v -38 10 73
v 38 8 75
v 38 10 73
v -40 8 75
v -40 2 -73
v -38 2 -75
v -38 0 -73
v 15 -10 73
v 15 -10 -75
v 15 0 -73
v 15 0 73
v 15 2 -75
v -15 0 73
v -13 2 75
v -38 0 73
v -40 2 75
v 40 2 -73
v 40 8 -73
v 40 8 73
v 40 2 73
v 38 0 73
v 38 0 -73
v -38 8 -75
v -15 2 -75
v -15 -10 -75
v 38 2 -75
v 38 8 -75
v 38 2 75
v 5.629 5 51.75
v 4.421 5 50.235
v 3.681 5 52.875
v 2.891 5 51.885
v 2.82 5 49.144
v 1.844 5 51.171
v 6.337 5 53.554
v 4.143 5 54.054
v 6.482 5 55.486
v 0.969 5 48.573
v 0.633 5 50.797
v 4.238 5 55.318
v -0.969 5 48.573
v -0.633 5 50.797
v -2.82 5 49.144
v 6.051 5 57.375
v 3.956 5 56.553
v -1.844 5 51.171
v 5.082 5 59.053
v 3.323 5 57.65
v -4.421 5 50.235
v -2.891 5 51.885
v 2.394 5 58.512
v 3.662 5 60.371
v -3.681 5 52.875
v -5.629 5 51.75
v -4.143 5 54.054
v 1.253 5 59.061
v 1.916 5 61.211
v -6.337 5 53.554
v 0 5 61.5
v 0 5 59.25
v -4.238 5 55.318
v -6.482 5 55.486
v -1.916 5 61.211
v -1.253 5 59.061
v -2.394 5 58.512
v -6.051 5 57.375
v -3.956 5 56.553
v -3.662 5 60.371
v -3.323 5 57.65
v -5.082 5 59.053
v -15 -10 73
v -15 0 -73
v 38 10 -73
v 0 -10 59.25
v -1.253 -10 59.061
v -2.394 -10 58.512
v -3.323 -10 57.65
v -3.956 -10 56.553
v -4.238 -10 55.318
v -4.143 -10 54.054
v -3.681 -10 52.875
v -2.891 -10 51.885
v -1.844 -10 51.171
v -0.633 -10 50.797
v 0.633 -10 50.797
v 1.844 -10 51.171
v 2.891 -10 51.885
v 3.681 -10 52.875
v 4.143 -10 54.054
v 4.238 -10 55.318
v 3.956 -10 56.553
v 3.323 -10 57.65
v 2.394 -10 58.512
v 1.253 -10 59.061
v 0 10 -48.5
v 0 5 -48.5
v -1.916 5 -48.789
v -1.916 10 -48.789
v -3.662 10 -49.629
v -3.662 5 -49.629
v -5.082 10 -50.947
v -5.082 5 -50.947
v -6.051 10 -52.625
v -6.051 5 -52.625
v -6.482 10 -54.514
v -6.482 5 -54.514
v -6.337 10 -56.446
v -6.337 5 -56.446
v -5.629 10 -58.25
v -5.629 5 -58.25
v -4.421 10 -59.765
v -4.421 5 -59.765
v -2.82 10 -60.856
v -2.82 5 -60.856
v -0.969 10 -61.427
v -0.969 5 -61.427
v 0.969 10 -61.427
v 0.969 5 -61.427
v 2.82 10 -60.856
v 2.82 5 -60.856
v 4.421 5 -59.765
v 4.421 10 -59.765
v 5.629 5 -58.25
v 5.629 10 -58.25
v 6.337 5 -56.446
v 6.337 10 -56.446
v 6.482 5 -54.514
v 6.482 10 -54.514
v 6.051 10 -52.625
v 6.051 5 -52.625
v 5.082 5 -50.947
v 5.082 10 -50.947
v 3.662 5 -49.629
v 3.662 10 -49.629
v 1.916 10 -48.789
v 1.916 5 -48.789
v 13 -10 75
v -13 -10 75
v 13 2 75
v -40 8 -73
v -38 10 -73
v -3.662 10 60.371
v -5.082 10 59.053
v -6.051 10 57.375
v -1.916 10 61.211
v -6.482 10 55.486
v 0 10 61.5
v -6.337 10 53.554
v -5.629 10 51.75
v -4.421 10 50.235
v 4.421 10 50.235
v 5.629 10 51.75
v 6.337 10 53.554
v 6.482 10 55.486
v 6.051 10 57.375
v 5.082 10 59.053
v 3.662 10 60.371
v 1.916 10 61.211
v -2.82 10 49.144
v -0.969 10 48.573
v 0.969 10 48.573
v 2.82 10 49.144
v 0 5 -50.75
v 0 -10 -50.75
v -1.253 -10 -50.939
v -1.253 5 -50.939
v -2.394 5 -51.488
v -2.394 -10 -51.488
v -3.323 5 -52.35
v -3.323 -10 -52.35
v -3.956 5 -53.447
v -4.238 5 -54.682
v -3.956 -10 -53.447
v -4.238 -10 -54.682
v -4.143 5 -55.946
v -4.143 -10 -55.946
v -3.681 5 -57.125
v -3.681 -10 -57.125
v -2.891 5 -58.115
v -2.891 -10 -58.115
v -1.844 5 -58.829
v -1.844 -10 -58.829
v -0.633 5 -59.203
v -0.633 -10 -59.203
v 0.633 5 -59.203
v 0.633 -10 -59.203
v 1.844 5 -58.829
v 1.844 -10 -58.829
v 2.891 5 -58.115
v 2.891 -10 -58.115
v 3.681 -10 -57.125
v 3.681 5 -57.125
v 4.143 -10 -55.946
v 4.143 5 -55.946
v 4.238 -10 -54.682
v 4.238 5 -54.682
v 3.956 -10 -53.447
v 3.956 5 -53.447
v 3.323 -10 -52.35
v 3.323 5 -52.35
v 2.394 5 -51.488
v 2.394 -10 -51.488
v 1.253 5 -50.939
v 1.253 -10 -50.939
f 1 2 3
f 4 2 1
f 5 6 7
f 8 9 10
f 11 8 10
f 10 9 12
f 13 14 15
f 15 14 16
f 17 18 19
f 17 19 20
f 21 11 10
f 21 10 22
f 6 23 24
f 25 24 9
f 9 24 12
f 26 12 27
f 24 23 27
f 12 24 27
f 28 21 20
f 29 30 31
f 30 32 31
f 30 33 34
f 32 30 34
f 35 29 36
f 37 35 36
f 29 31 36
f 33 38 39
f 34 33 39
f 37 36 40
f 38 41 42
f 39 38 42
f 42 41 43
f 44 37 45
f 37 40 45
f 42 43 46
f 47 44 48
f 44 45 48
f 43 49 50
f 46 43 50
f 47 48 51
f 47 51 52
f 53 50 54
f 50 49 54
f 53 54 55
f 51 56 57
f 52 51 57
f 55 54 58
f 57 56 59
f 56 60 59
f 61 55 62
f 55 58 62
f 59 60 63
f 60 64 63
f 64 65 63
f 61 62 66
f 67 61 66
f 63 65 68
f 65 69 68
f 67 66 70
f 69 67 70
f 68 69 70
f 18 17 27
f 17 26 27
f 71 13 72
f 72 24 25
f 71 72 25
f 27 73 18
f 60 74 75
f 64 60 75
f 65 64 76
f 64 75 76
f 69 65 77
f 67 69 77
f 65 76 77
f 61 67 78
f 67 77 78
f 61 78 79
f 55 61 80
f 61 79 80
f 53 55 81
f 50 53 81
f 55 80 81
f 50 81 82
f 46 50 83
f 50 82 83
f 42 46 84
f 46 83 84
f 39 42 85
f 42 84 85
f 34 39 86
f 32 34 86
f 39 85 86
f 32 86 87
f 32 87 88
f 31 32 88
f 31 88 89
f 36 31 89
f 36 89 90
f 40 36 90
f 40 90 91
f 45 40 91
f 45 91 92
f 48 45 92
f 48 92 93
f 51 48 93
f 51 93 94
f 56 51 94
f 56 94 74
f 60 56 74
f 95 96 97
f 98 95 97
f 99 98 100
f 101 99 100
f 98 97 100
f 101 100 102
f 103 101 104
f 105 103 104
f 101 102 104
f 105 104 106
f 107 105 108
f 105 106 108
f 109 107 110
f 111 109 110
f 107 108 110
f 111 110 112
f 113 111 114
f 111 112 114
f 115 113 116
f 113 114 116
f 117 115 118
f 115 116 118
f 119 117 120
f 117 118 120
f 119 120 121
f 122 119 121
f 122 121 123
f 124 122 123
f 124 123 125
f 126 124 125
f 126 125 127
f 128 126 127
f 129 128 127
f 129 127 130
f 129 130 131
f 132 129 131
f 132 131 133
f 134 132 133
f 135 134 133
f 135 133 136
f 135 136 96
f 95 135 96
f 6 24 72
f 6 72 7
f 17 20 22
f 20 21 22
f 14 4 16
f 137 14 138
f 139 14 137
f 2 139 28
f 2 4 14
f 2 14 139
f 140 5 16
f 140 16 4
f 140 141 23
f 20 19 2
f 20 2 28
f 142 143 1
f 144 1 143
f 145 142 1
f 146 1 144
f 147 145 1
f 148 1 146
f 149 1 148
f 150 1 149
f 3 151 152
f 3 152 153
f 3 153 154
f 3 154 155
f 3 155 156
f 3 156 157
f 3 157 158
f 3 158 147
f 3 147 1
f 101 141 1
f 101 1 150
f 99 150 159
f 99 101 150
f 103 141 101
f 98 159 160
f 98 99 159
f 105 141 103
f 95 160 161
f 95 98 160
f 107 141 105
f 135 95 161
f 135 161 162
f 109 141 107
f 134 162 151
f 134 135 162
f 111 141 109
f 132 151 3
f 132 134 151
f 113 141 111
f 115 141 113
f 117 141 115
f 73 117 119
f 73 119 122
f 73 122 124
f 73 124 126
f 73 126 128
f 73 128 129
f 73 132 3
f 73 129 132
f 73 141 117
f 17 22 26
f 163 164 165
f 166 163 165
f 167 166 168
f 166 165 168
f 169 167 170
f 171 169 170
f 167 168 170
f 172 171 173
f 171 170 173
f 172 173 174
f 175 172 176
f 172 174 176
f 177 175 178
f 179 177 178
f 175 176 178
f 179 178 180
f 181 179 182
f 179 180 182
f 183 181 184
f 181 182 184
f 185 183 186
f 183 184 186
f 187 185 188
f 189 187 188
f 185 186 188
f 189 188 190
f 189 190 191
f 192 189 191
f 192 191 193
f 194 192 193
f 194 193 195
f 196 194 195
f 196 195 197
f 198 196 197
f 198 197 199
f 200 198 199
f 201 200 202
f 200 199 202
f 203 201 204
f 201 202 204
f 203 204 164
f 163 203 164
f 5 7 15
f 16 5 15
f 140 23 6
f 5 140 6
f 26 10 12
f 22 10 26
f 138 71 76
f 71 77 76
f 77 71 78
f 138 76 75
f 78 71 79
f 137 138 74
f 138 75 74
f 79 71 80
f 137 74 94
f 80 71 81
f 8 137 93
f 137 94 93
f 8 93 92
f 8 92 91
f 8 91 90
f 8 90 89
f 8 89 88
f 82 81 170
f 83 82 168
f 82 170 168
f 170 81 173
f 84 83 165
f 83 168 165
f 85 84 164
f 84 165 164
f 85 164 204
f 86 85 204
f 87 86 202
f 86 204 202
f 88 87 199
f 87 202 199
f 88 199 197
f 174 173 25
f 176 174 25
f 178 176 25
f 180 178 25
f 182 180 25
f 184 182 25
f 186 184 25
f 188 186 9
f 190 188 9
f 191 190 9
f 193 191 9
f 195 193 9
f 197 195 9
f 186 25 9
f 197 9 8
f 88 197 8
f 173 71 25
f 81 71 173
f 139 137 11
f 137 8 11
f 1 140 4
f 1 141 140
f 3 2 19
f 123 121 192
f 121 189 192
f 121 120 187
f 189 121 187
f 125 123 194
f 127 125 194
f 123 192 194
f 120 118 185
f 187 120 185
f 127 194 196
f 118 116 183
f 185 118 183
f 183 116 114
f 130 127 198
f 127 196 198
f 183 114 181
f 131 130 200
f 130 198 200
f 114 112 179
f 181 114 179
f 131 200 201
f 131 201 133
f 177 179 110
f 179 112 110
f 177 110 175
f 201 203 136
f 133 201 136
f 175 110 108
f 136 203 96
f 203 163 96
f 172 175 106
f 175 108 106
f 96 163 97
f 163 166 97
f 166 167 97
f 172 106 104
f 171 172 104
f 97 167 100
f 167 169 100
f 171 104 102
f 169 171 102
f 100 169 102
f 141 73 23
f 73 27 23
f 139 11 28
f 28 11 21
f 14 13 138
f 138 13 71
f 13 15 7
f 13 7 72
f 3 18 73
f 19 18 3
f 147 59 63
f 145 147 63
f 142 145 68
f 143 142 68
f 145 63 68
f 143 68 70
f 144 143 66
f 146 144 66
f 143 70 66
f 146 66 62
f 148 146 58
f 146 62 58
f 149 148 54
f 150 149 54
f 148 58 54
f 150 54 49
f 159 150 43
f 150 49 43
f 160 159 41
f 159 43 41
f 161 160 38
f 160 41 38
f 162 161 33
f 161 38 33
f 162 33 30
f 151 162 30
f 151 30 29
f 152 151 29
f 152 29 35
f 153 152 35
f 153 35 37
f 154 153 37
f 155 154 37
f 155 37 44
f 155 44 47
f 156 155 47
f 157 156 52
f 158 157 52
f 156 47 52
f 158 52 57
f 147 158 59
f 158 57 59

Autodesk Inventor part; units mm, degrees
ref_plane "YZ Plane" through (0, 0, 0) normal (1, 0, 0) x (0, 1, 0)
ref_plane "XZ Plane" through (0, 0, 0) normal (0, 1, 0) x (-1, 0, 0)
ref_plane "XY Plane" through (0, 0, 0) normal (0, 0, 1) x (1, 0, 0)
sketch "Sketch3" plane through (0, 0, 0) normal (0, 0, 1) x (1, 0, 0)
  line L0 (-40, 0) -> (-40, 10)
  line L1 (-40, 10) -> (40, 10)
  line L2 (40, 10) -> (40, 0)
  line L3 (-40, 0) -> (-15, 0)
  line L4 (-15, 0) -> (-15, -10)
  line L5 (-15, -10) -> (15, -10)
  line L6 (15, -10) -> (15, 0)
  line L7 (15, 0) -> (40, 0)
  point P0 (0, 0)
  dimension "d0" = 40
  dimension "d1" = 10
  dimension "d2" = 80
  dimension "d6" = 25
  dimension "d7" = 10
  dimension "d8" = 30
  dimension "d9" = 10
extrude "Extrusion1" add sketch "Sketch3" along normal mid plane 150
sketch "Sketch4" plane through (-40, 10, 75) normal (0, 1, 0) x (1, 0, 0)
  point P0 (40, 75)
chamfer "Chamfer1" distance 2 angle 45 15 edges at (0, 10, 75) (0, 10, -75) (15, -5, 75) (27.5, 0, 75) (40, 0, 0) (27.5, 0, -75) (40, 5, 75) (40, 10, 0) (40, 5, -75) (-15, -5, 75) (-27.5, 0, -75) (-40, 10, 0) (-40, 5, -75) (-40, 0, 0) (-27.5, 0, 75)
sketch "Sketch5" plane through (-38, 10, -73) normal (0, 1, 0) x (1, 0, 0)
  circle A0 centre (38, -18) radius 5.6308
  circle A1 centre (38, -128) radius 5.6351
  line L0 (-2, -148) -> (76, -148) projected
  line L1 (76, 2) -> (0, 2) projected
  line L2 (76, 0) -> (76, -146) projected
  line L3 (78, -146) -> (78, 0) projected
  point P0 (38, -73)
  dimension "d13" = 20
  dimension "d14" = 20
  dimension "d16" = 40
  dimension "d17" = 40
hole "Hole1" at (0, 10, -55) at (0, 10, 55) direction (0, -1, 0) diameter 8.5 end through all counterbore diameter 13 counterbore depth 5
properties part number "Hanging bracket male"
